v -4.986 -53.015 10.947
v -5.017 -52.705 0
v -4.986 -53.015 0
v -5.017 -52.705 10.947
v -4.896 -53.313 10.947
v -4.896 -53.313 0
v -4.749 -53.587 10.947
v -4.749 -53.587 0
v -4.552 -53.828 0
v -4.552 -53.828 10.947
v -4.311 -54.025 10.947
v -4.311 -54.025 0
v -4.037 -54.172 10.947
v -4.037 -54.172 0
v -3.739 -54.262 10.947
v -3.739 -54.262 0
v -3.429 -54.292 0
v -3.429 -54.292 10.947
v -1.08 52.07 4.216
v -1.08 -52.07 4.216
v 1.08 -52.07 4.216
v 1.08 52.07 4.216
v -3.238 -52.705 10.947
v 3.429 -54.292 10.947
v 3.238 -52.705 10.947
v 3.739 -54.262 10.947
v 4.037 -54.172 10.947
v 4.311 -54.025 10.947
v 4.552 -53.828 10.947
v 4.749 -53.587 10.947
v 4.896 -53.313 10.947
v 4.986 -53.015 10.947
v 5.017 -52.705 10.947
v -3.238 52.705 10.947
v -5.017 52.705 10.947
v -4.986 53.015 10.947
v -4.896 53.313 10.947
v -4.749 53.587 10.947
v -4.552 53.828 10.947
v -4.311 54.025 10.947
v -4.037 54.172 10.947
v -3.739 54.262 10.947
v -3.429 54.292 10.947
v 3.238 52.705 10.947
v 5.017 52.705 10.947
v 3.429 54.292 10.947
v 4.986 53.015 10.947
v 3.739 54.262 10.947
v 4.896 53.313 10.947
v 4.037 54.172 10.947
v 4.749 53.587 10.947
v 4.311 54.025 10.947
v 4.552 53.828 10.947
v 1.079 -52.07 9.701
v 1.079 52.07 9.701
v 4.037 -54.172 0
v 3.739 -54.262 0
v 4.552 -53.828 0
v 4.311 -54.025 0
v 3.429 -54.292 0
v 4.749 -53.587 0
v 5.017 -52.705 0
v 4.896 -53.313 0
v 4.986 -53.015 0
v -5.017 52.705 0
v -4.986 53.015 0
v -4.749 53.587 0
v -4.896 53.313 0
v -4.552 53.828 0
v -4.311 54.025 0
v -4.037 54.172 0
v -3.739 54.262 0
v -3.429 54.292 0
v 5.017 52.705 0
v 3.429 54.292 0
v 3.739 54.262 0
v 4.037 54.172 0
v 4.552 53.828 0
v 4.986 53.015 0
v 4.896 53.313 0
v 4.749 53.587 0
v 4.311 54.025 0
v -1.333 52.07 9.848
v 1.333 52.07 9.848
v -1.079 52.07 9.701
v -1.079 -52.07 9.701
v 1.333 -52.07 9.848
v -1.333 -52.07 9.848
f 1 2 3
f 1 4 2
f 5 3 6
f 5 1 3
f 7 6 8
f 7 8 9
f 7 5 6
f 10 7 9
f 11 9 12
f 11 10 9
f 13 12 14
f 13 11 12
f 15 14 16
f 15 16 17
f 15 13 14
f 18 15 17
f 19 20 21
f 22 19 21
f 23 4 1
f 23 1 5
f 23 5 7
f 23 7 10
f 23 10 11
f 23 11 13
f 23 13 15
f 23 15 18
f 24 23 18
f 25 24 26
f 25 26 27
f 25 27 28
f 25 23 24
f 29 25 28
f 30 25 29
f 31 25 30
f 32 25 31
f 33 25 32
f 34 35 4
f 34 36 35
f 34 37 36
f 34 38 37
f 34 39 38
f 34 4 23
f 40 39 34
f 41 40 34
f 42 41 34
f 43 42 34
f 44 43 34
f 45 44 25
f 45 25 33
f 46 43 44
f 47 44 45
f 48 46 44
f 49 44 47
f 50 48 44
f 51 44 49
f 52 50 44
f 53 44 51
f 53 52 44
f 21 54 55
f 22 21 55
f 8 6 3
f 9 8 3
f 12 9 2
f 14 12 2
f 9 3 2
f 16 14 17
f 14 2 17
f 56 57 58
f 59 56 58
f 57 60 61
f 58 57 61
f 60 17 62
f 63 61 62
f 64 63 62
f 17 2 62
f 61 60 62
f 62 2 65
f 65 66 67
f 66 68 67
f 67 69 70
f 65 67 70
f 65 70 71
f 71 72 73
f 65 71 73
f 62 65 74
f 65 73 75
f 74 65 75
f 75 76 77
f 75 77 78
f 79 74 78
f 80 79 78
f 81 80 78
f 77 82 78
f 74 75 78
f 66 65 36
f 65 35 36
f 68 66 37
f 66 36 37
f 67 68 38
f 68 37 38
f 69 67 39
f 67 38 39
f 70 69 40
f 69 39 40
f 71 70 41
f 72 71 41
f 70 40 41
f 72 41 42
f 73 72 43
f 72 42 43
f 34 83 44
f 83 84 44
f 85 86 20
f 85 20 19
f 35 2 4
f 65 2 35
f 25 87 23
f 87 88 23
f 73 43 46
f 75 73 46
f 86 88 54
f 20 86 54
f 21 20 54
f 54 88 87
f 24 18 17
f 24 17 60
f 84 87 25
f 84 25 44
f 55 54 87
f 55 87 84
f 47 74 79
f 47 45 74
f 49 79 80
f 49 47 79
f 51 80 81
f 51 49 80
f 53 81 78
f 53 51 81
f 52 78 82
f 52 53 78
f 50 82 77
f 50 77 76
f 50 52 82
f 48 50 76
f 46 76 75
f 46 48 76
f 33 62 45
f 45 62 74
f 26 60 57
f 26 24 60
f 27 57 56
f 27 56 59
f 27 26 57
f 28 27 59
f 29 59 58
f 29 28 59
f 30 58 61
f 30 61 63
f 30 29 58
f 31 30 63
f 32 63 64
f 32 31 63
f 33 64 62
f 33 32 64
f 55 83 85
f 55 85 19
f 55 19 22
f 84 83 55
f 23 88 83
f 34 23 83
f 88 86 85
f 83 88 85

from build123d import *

# Parameters (mm, degrees)
SKETCH2_W          = 10.033
SKETCH2_H          = 108.585
EXTRUDE2_DEPTH     = 10.9474
FILLET1_R          = 1.5875
SKETCH7_W          = 2.159
SKETCH7_H          = 104.14
CUT_EXTRUDE2_DEPTH = 6.731
CHAMFER1_SIZE      = 2.159
CHAMFER1_SIZE2     = 1.246499231
CHAMFER2_SIZE      = 0.635
CHAMFER2_SIZE2     = 1.099852263


with BuildPart() as part:
    # Sketch2 → Extrude2 (new body)
    with BuildSketch(Plane.XY):
        Rectangle(SKETCH2_W, SKETCH2_H)
    extrude(amount=EXTRUDE2_DEPTH)

    # Fillet1
    fillet1_edges = [part.edges().sort_by_distance(p)[0] for p in [
        (-5.0165, 54.2925, 5.4737),
        (5.0165, 54.2925, 5.4737),
        (5.0165, -54.2925, 5.4737),
        (-5.0165, -54.2925, 5.4737),
    ]]
    fillet(fillet1_edges, radius=FILLET1_R)

    # Sketch7 → Cut-Extrude2 (cut)
    with BuildSketch(Plane.XY.offset(10.9474)):
        Rectangle(SKETCH7_W, SKETCH7_H)
    extrude(amount=-CUT_EXTRUDE2_DEPTH, mode=Mode.SUBTRACT)

    # Chamfer1
    chamfer1_edges = [part.edges().sort_by_distance(p)[0] for p in [
        (-1.0795, 0, 10.9474),
        (1.0795, 0, 10.9474),
    ]]
    chamfer1_side = [part.faces().sort_by_distance(p)[0] for p in [
        (0, 53.202024722, 10.9474),
    ]]
    chamfer(chamfer1_edges, length=CHAMFER1_SIZE, length2=CHAMFER1_SIZE2, reference=chamfer1_side[0])

    # Chamfer2
    chamfer2_edges = [part.edges().sort_by_distance(p)[0] for p in [
        (0, 52.07, 10.9474),
        (0, -52.07, 10.9474),
    ]]
    chamfer2_side = [part.faces().sort_by_distance(p)[0] for p in [
        (0, 53.160475278, 10.9474),
    ]]
    chamfer(chamfer2_edges, length=CHAMFER2_SIZE, length2=CHAMFER2_SIZE2, reference=chamfer2_side[0])


solid = part.part
